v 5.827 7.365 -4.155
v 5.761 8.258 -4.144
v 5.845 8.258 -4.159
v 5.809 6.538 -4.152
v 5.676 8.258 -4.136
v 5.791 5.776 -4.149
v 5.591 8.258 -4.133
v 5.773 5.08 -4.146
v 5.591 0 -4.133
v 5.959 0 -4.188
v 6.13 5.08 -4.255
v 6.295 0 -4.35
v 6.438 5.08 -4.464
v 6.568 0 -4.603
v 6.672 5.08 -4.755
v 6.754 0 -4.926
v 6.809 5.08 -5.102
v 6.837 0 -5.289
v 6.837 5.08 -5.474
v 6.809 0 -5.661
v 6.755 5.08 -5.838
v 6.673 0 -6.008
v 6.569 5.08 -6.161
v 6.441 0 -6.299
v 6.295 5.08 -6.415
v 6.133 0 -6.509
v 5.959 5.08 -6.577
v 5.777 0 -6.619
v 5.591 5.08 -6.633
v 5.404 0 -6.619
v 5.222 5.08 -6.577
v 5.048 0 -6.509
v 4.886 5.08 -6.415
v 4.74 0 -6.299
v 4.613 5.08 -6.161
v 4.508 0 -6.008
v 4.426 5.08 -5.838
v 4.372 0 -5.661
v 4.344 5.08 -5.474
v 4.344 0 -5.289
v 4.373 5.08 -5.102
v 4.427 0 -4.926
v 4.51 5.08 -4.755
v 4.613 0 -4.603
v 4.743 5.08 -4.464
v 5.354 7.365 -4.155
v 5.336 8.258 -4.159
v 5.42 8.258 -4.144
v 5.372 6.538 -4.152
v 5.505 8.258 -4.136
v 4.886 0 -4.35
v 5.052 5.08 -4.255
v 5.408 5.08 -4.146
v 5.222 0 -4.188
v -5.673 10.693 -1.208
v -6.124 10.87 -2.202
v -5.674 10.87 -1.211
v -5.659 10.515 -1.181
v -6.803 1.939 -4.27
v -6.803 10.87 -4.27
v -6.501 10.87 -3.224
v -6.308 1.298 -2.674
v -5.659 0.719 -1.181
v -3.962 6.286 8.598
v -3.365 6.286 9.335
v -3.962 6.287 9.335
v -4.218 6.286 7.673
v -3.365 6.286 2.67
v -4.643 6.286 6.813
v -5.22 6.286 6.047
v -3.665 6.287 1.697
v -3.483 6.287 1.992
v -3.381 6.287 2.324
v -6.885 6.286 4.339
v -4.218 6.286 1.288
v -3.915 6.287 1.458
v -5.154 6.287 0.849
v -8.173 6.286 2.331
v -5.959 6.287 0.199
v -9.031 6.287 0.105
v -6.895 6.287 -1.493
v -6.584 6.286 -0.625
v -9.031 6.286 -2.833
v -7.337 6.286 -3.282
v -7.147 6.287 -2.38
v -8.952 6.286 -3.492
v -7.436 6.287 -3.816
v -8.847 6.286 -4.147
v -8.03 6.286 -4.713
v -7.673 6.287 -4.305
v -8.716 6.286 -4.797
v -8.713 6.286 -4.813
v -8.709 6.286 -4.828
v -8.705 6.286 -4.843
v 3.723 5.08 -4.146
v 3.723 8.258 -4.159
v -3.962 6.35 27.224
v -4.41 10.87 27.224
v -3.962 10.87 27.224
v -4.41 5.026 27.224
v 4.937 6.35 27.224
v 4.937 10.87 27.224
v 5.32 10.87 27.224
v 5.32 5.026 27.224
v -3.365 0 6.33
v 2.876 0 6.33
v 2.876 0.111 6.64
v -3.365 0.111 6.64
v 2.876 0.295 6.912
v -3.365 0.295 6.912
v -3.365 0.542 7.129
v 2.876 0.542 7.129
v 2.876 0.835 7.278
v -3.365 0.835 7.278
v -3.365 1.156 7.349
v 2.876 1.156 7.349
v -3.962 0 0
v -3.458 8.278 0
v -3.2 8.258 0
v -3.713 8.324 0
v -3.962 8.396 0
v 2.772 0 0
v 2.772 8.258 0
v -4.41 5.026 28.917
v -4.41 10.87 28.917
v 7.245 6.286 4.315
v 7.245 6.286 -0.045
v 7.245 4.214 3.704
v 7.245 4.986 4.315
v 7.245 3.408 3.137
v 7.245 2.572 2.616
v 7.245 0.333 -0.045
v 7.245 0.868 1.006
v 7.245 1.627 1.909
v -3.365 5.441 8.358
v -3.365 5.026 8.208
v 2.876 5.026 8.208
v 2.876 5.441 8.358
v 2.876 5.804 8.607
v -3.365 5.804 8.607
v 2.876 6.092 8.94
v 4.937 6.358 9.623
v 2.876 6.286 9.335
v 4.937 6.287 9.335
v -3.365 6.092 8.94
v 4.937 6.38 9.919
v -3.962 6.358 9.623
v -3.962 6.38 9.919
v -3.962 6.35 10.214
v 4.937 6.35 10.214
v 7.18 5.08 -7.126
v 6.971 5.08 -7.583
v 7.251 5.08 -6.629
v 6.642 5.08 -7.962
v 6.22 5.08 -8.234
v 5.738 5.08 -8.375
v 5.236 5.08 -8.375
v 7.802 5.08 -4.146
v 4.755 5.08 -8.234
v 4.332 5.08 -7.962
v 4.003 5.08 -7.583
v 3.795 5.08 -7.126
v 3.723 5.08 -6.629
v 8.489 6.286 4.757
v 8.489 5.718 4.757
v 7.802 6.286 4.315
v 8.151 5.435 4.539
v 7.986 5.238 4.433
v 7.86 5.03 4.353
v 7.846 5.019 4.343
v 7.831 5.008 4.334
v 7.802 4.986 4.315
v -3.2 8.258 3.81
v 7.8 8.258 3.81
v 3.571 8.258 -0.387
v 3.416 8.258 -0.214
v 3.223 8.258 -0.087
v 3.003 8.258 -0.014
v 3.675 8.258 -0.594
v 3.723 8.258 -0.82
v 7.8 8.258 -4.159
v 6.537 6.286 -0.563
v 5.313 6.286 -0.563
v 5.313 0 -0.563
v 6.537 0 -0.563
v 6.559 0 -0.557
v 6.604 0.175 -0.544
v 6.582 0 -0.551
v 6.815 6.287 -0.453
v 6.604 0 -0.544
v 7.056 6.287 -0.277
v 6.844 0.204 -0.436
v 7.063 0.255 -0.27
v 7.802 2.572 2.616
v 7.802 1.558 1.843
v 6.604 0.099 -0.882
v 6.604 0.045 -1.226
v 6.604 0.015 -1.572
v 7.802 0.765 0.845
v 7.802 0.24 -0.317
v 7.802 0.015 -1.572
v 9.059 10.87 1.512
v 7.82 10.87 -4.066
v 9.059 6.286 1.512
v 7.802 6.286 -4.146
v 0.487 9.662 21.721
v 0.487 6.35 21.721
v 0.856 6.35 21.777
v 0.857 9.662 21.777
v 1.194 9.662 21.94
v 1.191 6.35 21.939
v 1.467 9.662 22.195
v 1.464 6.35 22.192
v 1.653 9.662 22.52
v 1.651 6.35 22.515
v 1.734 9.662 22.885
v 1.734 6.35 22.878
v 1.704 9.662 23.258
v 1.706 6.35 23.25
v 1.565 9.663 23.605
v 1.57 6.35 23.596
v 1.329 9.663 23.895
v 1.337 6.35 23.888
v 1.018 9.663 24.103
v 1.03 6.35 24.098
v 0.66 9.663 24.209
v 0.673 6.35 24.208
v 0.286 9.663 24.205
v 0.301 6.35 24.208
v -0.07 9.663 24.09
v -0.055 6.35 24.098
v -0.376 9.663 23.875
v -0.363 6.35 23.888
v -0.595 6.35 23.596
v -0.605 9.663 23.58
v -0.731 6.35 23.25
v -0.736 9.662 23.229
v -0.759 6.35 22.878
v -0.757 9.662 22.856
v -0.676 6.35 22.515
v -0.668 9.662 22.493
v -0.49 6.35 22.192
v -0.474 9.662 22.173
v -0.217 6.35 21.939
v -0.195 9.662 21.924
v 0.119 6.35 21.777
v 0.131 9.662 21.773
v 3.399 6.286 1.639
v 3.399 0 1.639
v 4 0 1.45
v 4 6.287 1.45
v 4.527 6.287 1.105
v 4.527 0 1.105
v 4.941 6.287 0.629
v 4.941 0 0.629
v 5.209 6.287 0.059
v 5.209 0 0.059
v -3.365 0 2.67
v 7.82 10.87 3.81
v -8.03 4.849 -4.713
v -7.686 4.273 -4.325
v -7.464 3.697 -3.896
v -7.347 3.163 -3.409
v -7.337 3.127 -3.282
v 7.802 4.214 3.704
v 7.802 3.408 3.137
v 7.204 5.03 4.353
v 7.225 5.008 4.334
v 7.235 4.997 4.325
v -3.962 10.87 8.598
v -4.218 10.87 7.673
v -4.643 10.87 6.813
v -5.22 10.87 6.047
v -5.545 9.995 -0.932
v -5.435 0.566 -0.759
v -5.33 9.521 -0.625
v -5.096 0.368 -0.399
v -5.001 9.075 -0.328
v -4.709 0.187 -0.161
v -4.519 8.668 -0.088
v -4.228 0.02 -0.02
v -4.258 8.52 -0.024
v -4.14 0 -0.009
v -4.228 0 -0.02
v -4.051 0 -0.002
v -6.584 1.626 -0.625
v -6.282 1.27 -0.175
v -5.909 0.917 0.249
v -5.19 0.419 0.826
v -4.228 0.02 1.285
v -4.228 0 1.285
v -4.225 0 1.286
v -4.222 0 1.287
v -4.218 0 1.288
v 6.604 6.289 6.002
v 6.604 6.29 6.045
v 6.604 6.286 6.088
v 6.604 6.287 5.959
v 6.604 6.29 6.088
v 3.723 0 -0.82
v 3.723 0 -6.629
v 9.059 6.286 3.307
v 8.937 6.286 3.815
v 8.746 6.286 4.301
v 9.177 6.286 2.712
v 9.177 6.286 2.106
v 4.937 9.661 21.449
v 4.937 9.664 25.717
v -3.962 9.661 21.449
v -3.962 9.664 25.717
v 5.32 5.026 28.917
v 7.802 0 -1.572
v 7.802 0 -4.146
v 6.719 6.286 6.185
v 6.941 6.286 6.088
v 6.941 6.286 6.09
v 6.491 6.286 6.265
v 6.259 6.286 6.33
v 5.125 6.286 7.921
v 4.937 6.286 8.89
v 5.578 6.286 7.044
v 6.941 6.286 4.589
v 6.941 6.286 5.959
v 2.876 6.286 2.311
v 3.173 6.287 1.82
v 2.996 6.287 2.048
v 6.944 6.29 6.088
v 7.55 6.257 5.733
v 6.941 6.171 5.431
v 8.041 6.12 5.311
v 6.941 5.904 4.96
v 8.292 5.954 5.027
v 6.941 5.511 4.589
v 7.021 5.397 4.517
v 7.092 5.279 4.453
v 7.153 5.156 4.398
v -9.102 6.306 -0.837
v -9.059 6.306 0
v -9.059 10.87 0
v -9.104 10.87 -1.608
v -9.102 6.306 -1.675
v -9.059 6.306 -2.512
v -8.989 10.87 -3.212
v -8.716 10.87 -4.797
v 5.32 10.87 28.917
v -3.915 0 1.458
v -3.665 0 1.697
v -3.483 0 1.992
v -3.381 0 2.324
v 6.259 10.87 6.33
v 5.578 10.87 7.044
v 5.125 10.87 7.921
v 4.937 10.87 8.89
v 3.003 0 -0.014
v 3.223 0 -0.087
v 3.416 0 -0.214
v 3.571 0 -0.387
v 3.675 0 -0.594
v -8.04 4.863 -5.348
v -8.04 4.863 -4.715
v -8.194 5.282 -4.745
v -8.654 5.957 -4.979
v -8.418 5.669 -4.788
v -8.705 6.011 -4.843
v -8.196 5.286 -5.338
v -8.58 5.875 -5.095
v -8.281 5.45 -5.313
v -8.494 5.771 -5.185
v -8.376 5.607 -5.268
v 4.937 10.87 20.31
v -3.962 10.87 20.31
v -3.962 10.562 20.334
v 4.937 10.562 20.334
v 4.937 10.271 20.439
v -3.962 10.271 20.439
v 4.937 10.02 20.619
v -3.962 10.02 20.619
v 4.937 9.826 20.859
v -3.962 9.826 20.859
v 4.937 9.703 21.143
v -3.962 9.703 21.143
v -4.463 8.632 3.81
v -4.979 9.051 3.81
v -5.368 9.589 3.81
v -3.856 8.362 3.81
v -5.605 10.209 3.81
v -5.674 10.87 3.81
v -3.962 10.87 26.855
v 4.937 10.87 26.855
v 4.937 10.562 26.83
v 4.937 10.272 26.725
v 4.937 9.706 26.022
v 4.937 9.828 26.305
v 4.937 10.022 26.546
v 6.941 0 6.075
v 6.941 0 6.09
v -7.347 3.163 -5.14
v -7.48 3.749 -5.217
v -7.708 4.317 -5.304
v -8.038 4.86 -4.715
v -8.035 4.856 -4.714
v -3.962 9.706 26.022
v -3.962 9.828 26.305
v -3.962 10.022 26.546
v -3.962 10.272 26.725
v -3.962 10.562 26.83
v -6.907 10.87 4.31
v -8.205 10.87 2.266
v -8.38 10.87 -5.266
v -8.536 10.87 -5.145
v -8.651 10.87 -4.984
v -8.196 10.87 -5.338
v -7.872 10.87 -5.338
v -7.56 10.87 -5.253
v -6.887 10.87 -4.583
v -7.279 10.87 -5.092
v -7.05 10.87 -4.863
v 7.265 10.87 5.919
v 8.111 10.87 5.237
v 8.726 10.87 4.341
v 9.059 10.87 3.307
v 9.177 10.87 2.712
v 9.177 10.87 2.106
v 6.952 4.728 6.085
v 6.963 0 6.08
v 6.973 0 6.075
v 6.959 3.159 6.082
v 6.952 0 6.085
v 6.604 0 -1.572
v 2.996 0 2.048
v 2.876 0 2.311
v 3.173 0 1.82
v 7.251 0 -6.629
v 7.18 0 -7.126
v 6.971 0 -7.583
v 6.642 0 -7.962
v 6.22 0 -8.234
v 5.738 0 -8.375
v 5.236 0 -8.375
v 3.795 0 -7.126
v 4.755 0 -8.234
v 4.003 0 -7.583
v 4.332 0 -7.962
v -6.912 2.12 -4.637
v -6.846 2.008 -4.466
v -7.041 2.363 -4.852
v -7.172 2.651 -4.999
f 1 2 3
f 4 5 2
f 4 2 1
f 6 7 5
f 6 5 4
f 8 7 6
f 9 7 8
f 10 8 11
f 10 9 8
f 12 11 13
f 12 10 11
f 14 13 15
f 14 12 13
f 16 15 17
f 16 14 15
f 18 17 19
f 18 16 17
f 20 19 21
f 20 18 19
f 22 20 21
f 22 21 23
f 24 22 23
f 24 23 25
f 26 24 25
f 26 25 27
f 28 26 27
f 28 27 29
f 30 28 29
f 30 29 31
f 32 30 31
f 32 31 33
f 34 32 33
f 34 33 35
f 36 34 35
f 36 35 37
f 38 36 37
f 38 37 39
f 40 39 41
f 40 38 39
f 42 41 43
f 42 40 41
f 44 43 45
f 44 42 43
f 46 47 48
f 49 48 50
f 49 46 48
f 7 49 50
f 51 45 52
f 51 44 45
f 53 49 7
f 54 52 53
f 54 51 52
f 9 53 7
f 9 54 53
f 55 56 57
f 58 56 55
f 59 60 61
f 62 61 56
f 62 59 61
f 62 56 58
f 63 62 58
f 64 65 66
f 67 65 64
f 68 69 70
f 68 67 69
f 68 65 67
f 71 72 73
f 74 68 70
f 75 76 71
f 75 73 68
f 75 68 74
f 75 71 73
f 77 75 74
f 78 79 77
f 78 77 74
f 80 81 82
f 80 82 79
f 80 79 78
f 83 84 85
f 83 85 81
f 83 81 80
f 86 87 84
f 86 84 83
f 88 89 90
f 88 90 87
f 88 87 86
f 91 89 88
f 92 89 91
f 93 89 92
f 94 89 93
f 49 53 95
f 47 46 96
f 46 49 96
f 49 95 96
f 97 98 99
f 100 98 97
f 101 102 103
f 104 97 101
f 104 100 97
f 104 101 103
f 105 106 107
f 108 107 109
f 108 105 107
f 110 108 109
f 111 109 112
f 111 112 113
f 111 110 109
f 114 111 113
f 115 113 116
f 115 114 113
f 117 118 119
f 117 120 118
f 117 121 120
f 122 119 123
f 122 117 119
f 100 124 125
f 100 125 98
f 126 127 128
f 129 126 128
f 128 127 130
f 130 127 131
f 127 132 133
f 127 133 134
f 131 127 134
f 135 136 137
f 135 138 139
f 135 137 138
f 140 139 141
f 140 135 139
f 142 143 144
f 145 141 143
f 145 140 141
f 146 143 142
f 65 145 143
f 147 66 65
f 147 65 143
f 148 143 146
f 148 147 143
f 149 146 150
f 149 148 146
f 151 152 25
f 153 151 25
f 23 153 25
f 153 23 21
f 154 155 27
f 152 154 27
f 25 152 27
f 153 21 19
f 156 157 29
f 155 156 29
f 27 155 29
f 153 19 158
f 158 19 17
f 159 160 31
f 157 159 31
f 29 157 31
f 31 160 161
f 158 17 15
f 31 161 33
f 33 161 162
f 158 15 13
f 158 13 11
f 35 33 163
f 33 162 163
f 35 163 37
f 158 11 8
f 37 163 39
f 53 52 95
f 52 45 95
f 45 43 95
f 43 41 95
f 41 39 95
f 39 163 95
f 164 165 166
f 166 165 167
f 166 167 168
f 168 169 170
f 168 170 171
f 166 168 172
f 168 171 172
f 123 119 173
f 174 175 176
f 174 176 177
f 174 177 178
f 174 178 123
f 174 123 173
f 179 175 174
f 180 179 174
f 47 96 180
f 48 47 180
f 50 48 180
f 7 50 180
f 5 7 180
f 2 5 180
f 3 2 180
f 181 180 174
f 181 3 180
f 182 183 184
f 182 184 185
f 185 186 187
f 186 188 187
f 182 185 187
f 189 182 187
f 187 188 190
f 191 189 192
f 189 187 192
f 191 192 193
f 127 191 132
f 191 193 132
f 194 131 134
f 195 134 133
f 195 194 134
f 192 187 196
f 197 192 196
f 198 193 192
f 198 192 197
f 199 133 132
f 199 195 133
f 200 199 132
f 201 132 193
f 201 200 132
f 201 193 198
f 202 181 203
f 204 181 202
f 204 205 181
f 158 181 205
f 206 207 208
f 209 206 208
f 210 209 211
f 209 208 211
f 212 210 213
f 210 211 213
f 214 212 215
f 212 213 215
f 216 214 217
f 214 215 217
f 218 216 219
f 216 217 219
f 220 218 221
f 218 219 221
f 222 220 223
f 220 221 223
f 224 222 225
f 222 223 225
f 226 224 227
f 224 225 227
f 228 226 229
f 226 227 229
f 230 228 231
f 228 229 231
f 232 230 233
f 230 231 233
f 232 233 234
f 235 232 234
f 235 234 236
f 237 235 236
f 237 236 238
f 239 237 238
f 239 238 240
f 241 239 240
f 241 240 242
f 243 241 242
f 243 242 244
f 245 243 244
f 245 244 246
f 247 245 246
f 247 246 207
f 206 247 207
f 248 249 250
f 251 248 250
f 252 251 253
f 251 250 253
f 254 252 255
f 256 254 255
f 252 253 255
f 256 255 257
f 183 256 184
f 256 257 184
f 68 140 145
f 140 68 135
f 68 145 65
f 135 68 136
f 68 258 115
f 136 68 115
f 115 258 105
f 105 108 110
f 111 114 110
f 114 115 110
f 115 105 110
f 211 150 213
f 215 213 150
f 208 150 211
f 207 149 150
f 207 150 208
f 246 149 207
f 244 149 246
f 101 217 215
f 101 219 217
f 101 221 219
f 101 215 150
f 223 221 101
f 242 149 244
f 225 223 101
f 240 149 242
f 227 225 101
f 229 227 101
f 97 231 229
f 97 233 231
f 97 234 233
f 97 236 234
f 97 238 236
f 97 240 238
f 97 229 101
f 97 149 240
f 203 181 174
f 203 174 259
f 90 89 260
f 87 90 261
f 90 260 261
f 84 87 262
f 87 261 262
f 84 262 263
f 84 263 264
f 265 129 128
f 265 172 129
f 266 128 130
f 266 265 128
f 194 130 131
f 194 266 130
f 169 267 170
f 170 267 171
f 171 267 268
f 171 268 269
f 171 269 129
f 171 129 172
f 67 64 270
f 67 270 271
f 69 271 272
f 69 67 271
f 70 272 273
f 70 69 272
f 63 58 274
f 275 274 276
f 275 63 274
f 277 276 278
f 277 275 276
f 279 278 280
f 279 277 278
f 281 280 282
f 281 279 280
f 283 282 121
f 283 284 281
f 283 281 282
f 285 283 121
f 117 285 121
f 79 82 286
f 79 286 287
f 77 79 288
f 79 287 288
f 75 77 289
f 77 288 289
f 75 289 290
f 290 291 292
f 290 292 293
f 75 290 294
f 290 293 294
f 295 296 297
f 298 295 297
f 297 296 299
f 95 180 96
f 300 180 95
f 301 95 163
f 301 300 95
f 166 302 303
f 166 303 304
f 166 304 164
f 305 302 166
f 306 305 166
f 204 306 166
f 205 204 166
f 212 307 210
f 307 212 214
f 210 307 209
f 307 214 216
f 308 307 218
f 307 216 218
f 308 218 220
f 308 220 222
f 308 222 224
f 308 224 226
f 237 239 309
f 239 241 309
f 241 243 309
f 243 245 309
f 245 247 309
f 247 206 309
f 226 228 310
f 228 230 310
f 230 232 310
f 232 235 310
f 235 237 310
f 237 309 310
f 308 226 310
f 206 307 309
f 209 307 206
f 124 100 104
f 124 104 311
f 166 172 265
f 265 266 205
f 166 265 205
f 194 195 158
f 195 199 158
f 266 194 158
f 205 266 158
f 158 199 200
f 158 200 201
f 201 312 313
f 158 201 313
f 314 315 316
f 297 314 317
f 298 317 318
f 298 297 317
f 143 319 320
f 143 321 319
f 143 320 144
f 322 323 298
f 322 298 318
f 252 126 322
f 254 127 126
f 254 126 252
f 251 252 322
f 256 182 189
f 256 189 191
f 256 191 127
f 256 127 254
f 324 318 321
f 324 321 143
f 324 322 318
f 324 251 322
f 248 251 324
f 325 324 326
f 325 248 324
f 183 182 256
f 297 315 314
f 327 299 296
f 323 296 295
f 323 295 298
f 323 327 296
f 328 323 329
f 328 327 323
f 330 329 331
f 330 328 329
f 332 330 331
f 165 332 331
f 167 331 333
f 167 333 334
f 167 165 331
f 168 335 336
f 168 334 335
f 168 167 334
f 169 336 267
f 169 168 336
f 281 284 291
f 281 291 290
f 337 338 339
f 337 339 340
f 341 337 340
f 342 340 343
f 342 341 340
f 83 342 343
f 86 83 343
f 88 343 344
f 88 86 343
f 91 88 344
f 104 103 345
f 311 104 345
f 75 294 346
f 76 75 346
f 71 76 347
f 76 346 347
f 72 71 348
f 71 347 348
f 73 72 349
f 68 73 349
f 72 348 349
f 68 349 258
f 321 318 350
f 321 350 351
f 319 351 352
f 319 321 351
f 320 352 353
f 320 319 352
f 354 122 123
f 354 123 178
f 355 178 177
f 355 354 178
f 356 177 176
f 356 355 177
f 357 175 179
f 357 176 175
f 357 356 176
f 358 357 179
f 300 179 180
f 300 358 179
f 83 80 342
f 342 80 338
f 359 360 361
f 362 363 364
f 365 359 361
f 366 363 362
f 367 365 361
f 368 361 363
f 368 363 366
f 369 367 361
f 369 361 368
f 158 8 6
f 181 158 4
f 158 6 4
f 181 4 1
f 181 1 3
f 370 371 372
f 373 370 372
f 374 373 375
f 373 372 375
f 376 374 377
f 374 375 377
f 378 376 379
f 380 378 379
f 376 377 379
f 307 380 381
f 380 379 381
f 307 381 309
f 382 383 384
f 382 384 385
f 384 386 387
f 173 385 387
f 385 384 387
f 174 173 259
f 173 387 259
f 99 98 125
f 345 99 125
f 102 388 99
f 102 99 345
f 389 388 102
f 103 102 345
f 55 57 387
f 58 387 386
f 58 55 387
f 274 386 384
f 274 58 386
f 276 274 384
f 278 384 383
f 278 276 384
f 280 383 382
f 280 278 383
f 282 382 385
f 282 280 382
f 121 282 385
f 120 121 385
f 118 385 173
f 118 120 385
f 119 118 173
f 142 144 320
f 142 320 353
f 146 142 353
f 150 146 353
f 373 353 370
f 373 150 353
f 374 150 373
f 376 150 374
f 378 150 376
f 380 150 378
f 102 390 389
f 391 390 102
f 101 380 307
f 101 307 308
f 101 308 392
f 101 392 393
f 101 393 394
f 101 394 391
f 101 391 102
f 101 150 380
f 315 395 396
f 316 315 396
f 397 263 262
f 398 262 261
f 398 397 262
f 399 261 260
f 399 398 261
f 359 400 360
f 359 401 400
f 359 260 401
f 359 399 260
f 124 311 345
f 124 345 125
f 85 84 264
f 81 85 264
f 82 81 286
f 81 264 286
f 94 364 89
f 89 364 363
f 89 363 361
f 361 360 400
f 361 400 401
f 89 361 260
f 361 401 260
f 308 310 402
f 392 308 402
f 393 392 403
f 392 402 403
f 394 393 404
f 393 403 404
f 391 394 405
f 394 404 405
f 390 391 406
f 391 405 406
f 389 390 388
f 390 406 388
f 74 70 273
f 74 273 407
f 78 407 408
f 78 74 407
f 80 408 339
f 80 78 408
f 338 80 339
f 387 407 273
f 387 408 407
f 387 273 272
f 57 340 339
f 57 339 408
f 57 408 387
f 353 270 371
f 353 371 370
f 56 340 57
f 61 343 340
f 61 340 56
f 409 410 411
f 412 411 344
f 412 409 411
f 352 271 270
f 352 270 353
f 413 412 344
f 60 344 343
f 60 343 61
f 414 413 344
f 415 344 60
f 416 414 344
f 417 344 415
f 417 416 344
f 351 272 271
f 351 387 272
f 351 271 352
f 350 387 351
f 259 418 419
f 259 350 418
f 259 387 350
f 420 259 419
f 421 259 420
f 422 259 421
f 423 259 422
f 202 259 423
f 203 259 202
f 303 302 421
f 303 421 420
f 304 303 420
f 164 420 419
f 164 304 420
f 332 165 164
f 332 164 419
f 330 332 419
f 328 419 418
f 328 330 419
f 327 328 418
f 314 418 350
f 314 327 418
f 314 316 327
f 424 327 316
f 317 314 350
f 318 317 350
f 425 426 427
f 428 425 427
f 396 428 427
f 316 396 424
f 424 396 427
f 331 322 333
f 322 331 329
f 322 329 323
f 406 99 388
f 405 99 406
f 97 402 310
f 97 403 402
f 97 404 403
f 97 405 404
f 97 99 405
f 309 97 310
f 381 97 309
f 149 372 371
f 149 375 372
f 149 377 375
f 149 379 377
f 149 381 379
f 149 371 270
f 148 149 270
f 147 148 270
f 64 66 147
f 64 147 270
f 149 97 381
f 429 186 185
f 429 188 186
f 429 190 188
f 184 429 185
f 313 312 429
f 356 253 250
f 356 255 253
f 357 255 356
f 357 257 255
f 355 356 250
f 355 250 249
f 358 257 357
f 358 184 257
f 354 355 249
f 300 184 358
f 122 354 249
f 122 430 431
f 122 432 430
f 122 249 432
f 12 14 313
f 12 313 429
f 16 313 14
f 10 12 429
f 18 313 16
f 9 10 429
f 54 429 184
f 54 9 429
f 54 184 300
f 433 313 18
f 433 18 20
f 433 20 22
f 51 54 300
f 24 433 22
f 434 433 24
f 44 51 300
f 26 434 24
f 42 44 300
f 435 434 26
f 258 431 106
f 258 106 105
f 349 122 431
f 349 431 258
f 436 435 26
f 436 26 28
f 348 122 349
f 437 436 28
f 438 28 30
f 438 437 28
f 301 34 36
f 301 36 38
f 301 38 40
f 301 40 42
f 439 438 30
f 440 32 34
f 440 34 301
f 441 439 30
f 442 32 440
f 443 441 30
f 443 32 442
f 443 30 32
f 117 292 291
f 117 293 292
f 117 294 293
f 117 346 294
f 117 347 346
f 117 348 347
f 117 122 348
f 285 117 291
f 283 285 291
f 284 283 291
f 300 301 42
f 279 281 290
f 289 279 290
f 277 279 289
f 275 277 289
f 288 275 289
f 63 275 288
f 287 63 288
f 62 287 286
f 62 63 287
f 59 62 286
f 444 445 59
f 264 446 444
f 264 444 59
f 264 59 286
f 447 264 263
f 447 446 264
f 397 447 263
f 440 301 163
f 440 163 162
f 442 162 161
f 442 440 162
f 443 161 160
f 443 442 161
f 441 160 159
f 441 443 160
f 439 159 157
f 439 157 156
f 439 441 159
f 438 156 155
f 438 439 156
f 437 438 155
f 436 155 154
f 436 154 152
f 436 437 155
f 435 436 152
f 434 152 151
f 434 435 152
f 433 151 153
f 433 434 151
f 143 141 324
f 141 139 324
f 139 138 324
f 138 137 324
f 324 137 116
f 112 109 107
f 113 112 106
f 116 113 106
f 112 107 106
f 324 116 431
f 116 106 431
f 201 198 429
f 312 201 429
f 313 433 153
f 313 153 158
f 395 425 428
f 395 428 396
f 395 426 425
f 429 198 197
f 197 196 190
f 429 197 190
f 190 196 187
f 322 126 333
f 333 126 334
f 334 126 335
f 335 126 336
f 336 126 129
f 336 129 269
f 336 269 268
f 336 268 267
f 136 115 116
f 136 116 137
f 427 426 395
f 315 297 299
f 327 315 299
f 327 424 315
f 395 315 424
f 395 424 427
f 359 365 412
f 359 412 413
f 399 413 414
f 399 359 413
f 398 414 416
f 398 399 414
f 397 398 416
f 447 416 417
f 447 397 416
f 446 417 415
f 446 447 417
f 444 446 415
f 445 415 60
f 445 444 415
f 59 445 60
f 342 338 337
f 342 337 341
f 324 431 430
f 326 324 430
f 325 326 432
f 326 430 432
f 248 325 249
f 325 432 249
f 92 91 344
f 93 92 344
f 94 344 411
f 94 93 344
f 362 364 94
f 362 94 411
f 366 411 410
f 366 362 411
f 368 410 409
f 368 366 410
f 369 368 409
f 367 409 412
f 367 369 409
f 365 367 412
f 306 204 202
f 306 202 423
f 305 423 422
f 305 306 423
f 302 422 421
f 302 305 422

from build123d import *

# Parameters (mm, degrees)
BOSS_EXTRUDE1_DEPTH      = 431.8
CUT_EXTRUDE1_DEPTH       = 190.5
CUT_EXTRUDE1_DEPTH_BACK  = 190.5
CUT_EXTRUDE2_DEPTH       = 125.73
CUT_EXTRUDE4_DEPTH       = 128.27
CUT_EXTRUDE4_DEPTH_BACK  = 120.65
CUT_EXTRUDE5_DEPTH       = 125.73
CUT_EXTRUDE7_DEPTH       = 161.29
CUT_EXTRUDE8_DEPTH       = 45.72
CUT_EXTRUDE9_DEPTH       = 104.14
CUT_EXTRUDE9_DEPTH_BACK  = 88.9
SKETCH12_R               = 25
CUT_EXTRUDE10_DEPTH      = 431.8
CUT_EXTRUDE11_DEPTH      = 76.2
CUT_EXTRUDE11_DEPTH_BACK = 88.9
SCALE1_SCALE             = 0.05
CUT_EXTRUDE14_DEPTH      = 10
CUT_EXTRUDE14_DEPTH_BACK = 80
SKETCH17_R               = 1.25
CUT_EXTRUDE16_DEPTH      = 10


with BuildPart() as part:
    # Sketch2 → Boss-Extrude1 (new body)
    with BuildSketch(Plane(origin=(0, 0, 0), x_dir=(1, 0, 0), z_dir=(0, 1, 0))):
        with BuildLine():
            Line((-79.244298522, 0), (55.440912384, 0))
            ThreePointArc((55.440912384, 0), (68.327741041, 4.288291197), (74.467971072, 16.4026368))
            Line((74.467971072, 16.4026368), (74.467971072, 72.827707392))
            Line((74.467971072, 72.827707392), (74.467971072, 132.581872657))
            ThreePointArc((74.467971072, 132.581872657), (109.746022134, 167.859923719), (145.024073196, 132.581872657))
            Line((145.024073196, 132.581872657), (181.17312, -30.23334015))
            ThreePointArc((181.17312, -30.23334015), (183.82679773, -48.184385864), (181.17312, -66.135431578))
            ThreePointArc((181.17312, -66.135431578), (162.228077841, -104.747606276), (125.184924058, -126.602111877))
            ThreePointArc((125.184924058, -126.602111877), (106.407786564, -149.335868365), (98.730751427, -177.804582912))
            Line((98.730751427, -177.804582912), (98.730751427, -544.478753158))
            Line((98.730751427, -544.478753158), (106.407786564, -544.478753158))
            Line((106.407786564, -544.478753158), (106.407786564, -578.332354391))
            Line((106.407786564, -578.332354391), (-88.206932207, -578.332354391))
            Line((-88.206932207, -578.332354391), (-88.206932207, -544.478753158))
            Line((-88.206932207, -544.478753158), (-79.244298522, -544.478753158))
            Line((-79.244298522, -544.478753158), (-79.244298522, -171.952122102))
            ThreePointArc((-79.244298522, -171.952122102), (-88.206932207, -144.660352565), (-104.399502705, -120.933360599))
            ThreePointArc((-104.399502705, -120.933360599), (-152.176796458, -66.428157812), (-181.17312, 0))
            ThreePointArc((-181.17312, 0), (-181.323655947, 48.230174732), (-174.314101801, 95.9485))
            ThreePointArc((-174.314101801, 95.9485), (-170.720922927, 102.895856482), (-163.921391124, 106.761482404))
            ThreePointArc((-163.921391124, 106.761482404), (-145.58136446, 101.830499971), (-136.054979803, 85.401283278))
            ThreePointArc((-136.054979803, 85.401283278), (-126.311948352, 53.883000562), (-113.17819392, 23.620262719))
            ThreePointArc((-113.17819392, 23.620262719), (-99.916901574, 6.486425919), (-79.244298522, 0))
        make_face()
    extrude(amount=BOSS_EXTRUDE1_DEPTH)

    # Sketch3 → Cut-Extrude1 (cut, two sides: drawn at the far end of the back side and taken through both)
    with BuildSketch(Plane(origin=(0, 0, 0), x_dir=(0, 0, -1), z_dir=(1, 0, 0)).offset(-CUT_EXTRUDE1_DEPTH_BACK)):
        with BuildLine():
            Line((-204.28108922, 127), (-544.478753158, 127))
            Line((-544.478753158, 127), (-544.478753158, 100.52839733))
            Line((-544.478753158, 100.52839733), (-578.332354391, 100.52839733))
            Line((-578.332354391, 100.52839733), (-578.332354391, 0))
            Line((-578.332354391, 0), (-126.602111877, 0))
            ThreePointArc((-126.602111877, 0), (-140.566602846, 8.233208943), (-146.973522261, 23.12428416))
            Line((-146.973522261, 23.12428416), (-164.165792349, 100.52839733))
            ThreePointArc((-164.165792349, 100.52839733), (-178.868176776, 121.87961231), (-204.28108922, 127))
        make_face()
        with BuildLine():
            Line((-204.28108922, 304.8), (-544.478753158, 304.8))
            Line((-544.478753158, 304.8), (-544.478753158, 331.668917397))
            Line((-544.478753158, 331.668917397), (-578.332354391, 331.668917397))
            Line((-578.332354391, 331.668917397), (-578.332354391, 431.8))
            Line((-578.332354391, 431.8), (-126.602111877, 431.8))
            ThreePointArc((-126.602111877, 431.8), (-140.684053109, 425.838191425), (-146.973522261, 411.89951114))
            Line((-146.973522261, 411.89951114), (-164.165792349, 331.668917397))
            ThreePointArc((-164.165792349, 331.668917397), (-181.197219127, 313.716309403), (-204.28108922, 304.8))
        make_face()
    extrude(amount=CUT_EXTRUDE1_DEPTH + CUT_EXTRUDE1_DEPTH_BACK, mode=Mode.SUBTRACT)

    # Sketch4 → Cut-Extrude2 (cut)
    with BuildSketch(Plane(origin=(0, 431.8, 0), x_dir=(1, 0, 0), z_dir=(0, 1, 0))):
        Polygon((155.84555549, -87.211031478), (155.84555549, 83.841944542), (226.394952987, -1.684543468), (177.876923144, -101.374053541), align=None)
        with BuildLine():
            Line((57.318052164, -164.165792349), (57.318052164, -47.130284905))
            ThreePointArc((57.318052164, -47.130284905), (61.348404683, -39.477358819), (67.773769346, -33.687219957))
            ThreePointArc((67.773769346, -33.687219957), (94.808127688, -18.527489601), (106.050536967, 10.356453845))
            Line((106.050536967, 10.356453845), (130.534952263, 10.356453845))
            ThreePointArc((130.534952263, 10.356453845), (138.616208532, 6.545433697), (144.697974326, 0))
            Line((144.697974326, 0), (144.697974326, -87.211031478))
            Line((144.697974326, -87.211031478), (138.616208532, -92.687338339))
            Line((138.616208532, -92.687338339), (138.616208532, -164.165792349))
            Line((138.616208532, -164.165792349), (138.616208532, -204.28108922))
            Line((138.616208532, -204.28108922), (57.318052164, -204.28108922))
            Line((57.318052164, -204.28108922), (57.318052164, -164.165792349))
        make_face()
        with BuildLine():
            Line((-174.314101801, 95.9485), (-160.803012267, 93.363428502))
            ThreePointArc((-160.803012267, 93.363428502), (-150.960378938, 80.465137541), (-146.941851349, 64.745888939))
            ThreePointArc((-146.941851349, 64.745888939), (-140.774296617, 37.783553429), (-131.885618608, 11.591996185))
            ThreePointArc((-131.885618608, 11.591996185), (-111.728690537, -11.869907513), (-84.566029991, -26.666952706))
            ThreePointArc((-84.566029991, -26.666952706), (-71.496208015, -37.684459203), (-67.501620029, -54.305198138))
            Line((-67.501620029, -54.305198138), (-67.501620029, -164.165792349))
            Line((-67.501620029, -164.165792349), (-67.501620029, -204.28108922))
            Line((-67.501620029, -204.28108922), (-94.807796549, -204.28108922))
            Line((-94.807796549, -204.28108922), (-106.074933908, -164.165792349))
            Line((-106.074933908, -164.165792349), (-212.544008295, 0))
            Line((-212.544008295, 0), (-212.544008295, 95.9485))
            Line((-212.544008295, 95.9485), (-174.314101801, 95.9485))
        make_face()
    extrude(amount=-CUT_EXTRUDE2_DEPTH, mode=Mode.SUBTRACT)

    # Sketch6 → Cut-Extrude4 (cut, two sides: drawn at the far end of the back side and taken through both)
    with BuildSketch(Plane.XY.offset(-CUT_EXTRUDE4_DEPTH_BACK)):
        with BuildLine():
            Line((-181.17312, 306.07), (-200.286673994, 306.07))
            Line((-200.286673994, 306.07), (-200.286673994, 431.8))
            Line((-200.286673994, 431.8), (-84.566029991, 431.8))
            ThreePointArc((-84.566029991, 431.8), (-123.973907642, 408.523503999), (-146.941851349, 368.935))
            ThreePointArc((-146.941851349, 368.935), (-151.793508278, 351.084070168), (-160.803012267, 334.927860566))
            ThreePointArc((-160.803012267, 334.927860566), (-168.44948447, 318.707003198), (-181.17312, 306.07))
        make_face()
        with BuildLine():
            Line((-181.17312, 126.127314727), (-200.286673994, 126.127314727))
            Line((-200.286673994, 126.127314727), (-200.286673994, 0.397314727))
            Line((-200.286673994, 0.397314727), (-200.286673994, -9.335489314))
            Line((-200.286673994, -9.335489314), (-84.566029991, -9.335489314))
            Line((-84.566029991, -9.335489314), (-84.566029991, 0.397314727))
            ThreePointArc((-84.566029991, 0.397314727), (-123.973907642, 23.673810728), (-146.941851349, 63.262314727))
            ThreePointArc((-146.941851349, 63.262314727), (-151.793508278, 81.113244559), (-160.803012267, 97.26945416))
            ThreePointArc((-160.803012267, 97.26945416), (-168.44948447, 113.490311529), (-181.17312, 126.127314727))
        make_face()
    extrude(amount=CUT_EXTRUDE4_DEPTH + CUT_EXTRUDE4_DEPTH_BACK, mode=Mode.SUBTRACT)

    # Sketch7 → Cut-Extrude5 (cut)
    with BuildSketch(Plane(origin=(0, 0, 0), x_dir=(1, 0, 0), z_dir=(0, 1, 0))):
        Polygon((156.049496363, -86.308866012), (156.049496363, 84.744110008), (226.598893859, -0.782378002), (178.080864016, -100.471888075), align=None)
        with BuildLine():
            Line((57.521993037, -163.263626883), (57.521993037, -46.228119439))
            ThreePointArc((57.521993037, -46.228119439), (61.552345555, -38.575193353), (67.977710219, -32.785054491))
            ThreePointArc((67.977710219, -32.785054491), (95.01206856, -17.625324135), (106.25447784, 11.258619311))
            Line((106.25447784, 11.258619311), (130.738893135, 11.258619311))
            ThreePointArc((130.738893135, 11.258619311), (138.820149404, 7.447599163), (144.901915198, 0.902165466))
            Line((144.901915198, 0.902165466), (144.901915198, -86.308866012))
            Line((144.901915198, -86.308866012), (138.820149404, -91.785172873))
            Line((138.820149404, -91.785172873), (138.820149404, -163.263626883))
            Line((138.820149404, -163.263626883), (138.820149404, -203.378923754))
            Line((138.820149404, -203.378923754), (57.521993037, -203.378923754))
            Line((57.521993037, -203.378923754), (57.521993037, -163.263626883))
        make_face()
        with BuildLine():
            Line((-174.110160928, 96.850665466), (-160.599071394, 94.265593968))
            ThreePointArc((-160.599071394, 94.265593968), (-150.756438066, 81.367303007), (-146.737910477, 65.648054405))
            ThreePointArc((-146.737910477, 65.648054405), (-140.570355744, 38.685718895), (-131.681677735, 12.494161651))
            ThreePointArc((-131.681677735, 12.494161651), (-111.524749665, -10.967742047), (-84.362089119, -25.76478724))
            ThreePointArc((-84.362089119, -25.76478724), (-71.292267142, -36.782293737), (-67.297679156, -53.403032672))
            Line((-67.297679156, -53.403032672), (-67.297679156, -163.263626883))
            Line((-67.297679156, -163.263626883), (-67.297679156, -203.378923754))
            Line((-67.297679156, -203.378923754), (-94.603855676, -203.378923754))
            Line((-94.603855676, -203.378923754), (-105.870993035, -163.263626883))
            Line((-105.870993035, -163.263626883), (-212.340067422, 0.902165466))
            Line((-212.340067422, 0.902165466), (-212.340067422, 96.850665466))
            Line((-212.340067422, 96.850665466), (-174.110160928, 96.850665466))
        make_face()
    extrude(amount=CUT_EXTRUDE5_DEPTH, mode=Mode.SUBTRACT)

    # Sketch8 → Cut-Extrude7 (cut)
    with BuildSketch(Plane(origin=(0, 0, 0), x_dir=(0, 0, -1), z_dir=(1, 0, 0))):
        Polygon((167.859923719, 215.9), (167.859923719, 101.6), (82.923395382, 101.6), (83.841944542, 330.2), (167.859923719, 330.2), align=None)
    extrude(amount=CUT_EXTRUDE7_DEPTH, mode=Mode.SUBTRACT)

    # Sketch9 → Cut-Extrude8 (cut)
    with BuildSketch(Plane(origin=(177.8, 0, 0), x_dir=(0, 0, -1), z_dir=(1, 0, 0))):
        with BuildLine():
            Line((31.13006407, 431.8), (31.13006407, 493.405620114))
            Line((31.13006407, 493.405620114), (-121.748062484, 493.405620114))
            Line((-121.748062484, 493.405620114), (-121.892848155, 306.07))
            ThreePointArc((-121.892848155, 306.07), (-100.412110743, 313.016001375), (-87.211031478, 331.329944727))
            ThreePointArc((-87.211031478, 331.329944727), (-68.814678471, 355.183985364), (-52.549790031, 380.539348952))
            ThreePointArc((-52.549790031, 380.539348952), (-17.173940566, 416.721882811), (31.13006407, 431.8))
        make_face()
        with BuildLine():
            Line((-121.360940458, -61.527139811), (-121.767097148, 125.808095964))
            ThreePointArc((-121.767097148, 125.808095964), (-100.276689563, 118.892071333), (-87.050071484, 100.596563986))
            ThreePointArc((-87.050071484, 100.596563986), (-68.62045516, 76.768213208), (-52.320206679, 51.435567114))
            ThreePointArc((-52.320206679, 51.435567114), (-16.893909677, 15.302424951), (31.431084974, 0.291716314))
            Line((31.431084974, 0.291716314), (31.517037301, -61.313843839))
            Line((31.517037301, -61.313843839), (-121.360940458, -61.527139811))
        make_face()
    extrude(amount=-CUT_EXTRUDE8_DEPTH, mode=Mode.SUBTRACT)


with BuildPart() as cut_extrude8_piece_1:
    # of the separate pieces the step leaves, piece 1, a body of its own (cut_extrude8_pieces)
    add(part.part.solids().sort_by_distance((-113.17819392, 14.385260939, -23.620262719))[0])

    # Sketch10 → Cut-Extrude9 (cut, two sides: drawn at the far end of the back side and taken through both)
    with BuildSketch(Plane(origin=(0, 0, 0), x_dir=(0, 0, -1), z_dir=(1, 0, 0)).offset(-CUT_EXTRUDE9_DEPTH_BACK)):
        with BuildLine():
            Line((-428.983201738, 193.229592666), (-514.334244368, 193.275834301))
            ThreePointArc((-514.334244368, 193.275834301), (-537.128372855, 216.094675062), (-514.309532095, 238.888803549))
            Line((-514.309532095, 238.888803549), (-428.958489465, 238.842561914))
            ThreePointArc((-428.958489465, 238.842561914), (-406.164360977, 216.023721154), (-428.983201738, 193.229592666))
        make_face()
    extrude(amount=CUT_EXTRUDE9_DEPTH + CUT_EXTRUDE9_DEPTH_BACK, mode=Mode.SUBTRACT)

    # Sketch12 → Cut-Extrude10 (cut)
    with BuildSketch(Plane(origin=(0, 0, 0), x_dir=(1, 0, 0), z_dir=(0, 1, 0))):
        with Locations(Location((111.812353192, 107.656197962, 0), (0, 0, 270))):
            Circle(SKETCH12_R)
    extrude(amount=CUT_EXTRUDE10_DEPTH, mode=Mode.SUBTRACT)

    # Sketch13 → Cut-Extrude11 (cut, two sides: drawn at the far end of the back side and taken through both)
    with BuildSketch(Plane.XY.offset(-CUT_EXTRUDE11_DEPTH_BACK)):
        with BuildLine():
            Line((156.793476245, 266.763254357), (-63.998127701, 266.763254357))
            ThreePointArc((-63.998127701, 266.763254357), (-113.494417347, 215.963254357), (-63.998127701, 165.163254357))
            Line((-63.998127701, 165.163254357), (155.992789689, 165.163254357))
            Line((155.992789689, 165.163254357), (156.793476245, 266.763254357))
        make_face()
    extrude(amount=CUT_EXTRUDE11_DEPTH + CUT_EXTRUDE11_DEPTH_BACK, mode=Mode.SUBTRACT)


with BuildPart() as cut_extrude8_piece_2:
    # of the separate pieces the step leaves, piece 2, a body of its own (cut_extrude8_pieces)
    add(part.part.solids().sort_by_distance((138.825981411, 431.8, 121.795675485))[0])


with BuildPart() as cut_extrude8_piece_1_1:
    # Scale1: scaled about (0, 0, 0)
    add(cut_extrude8_piece_1.part.scale(SCALE1_SCALE))


with BuildPart() as cut_extrude8_piece_2_1:
    # Scale1: scaled about (0, 0, 0)
    add(cut_extrude8_piece_2.part.scale(SCALE1_SCALE))


with BuildPart() as cut_extrude14_tool:
    # Sketch15 → Cut-Extrude14 (new, two sides: drawn at the far end of the back side and taken through both)
    with BuildSketch(Plane.XY.offset(28.91661772).offset(-CUT_EXTRUDE14_DEPTH_BACK)):
        Polygon((-19.41034661, 10.869789513), (25.58965339, 10.869789513), (25.58965339, 45.642776715), (-19.41034661, 47.662845319), align=None)
    extrude(amount=CUT_EXTRUDE14_DEPTH + CUT_EXTRUDE14_DEPTH_BACK)


with BuildPart() as cut_extrude8_piece_1_2:
    add(cut_extrude8_piece_1_1.part)

    # Cut-Extrude14: cut by cut_extrude14_tool
    add(cut_extrude14_tool.part, mode=Mode.SUBTRACT)

    # Sketch17 → Cut-Extrude16 (cut)
    with BuildSketch(Plane.XZ.offset(-6.35)):
        with Locations(Location((0.487161323, 22.971466859, 0), (0, 0, 270))):
            Circle(SKETCH17_R)
    extrude(amount=-CUT_EXTRUDE16_DEPTH, mode=Mode.SUBTRACT)


with BuildPart() as cut_extrude8_piece_2_2:
    add(cut_extrude8_piece_2_1.part)

    # Cut-Extrude14: cut by cut_extrude14_tool
    add(cut_extrude14_tool.part, mode=Mode.SUBTRACT)


solid = cut_extrude8_piece_1_2.part
